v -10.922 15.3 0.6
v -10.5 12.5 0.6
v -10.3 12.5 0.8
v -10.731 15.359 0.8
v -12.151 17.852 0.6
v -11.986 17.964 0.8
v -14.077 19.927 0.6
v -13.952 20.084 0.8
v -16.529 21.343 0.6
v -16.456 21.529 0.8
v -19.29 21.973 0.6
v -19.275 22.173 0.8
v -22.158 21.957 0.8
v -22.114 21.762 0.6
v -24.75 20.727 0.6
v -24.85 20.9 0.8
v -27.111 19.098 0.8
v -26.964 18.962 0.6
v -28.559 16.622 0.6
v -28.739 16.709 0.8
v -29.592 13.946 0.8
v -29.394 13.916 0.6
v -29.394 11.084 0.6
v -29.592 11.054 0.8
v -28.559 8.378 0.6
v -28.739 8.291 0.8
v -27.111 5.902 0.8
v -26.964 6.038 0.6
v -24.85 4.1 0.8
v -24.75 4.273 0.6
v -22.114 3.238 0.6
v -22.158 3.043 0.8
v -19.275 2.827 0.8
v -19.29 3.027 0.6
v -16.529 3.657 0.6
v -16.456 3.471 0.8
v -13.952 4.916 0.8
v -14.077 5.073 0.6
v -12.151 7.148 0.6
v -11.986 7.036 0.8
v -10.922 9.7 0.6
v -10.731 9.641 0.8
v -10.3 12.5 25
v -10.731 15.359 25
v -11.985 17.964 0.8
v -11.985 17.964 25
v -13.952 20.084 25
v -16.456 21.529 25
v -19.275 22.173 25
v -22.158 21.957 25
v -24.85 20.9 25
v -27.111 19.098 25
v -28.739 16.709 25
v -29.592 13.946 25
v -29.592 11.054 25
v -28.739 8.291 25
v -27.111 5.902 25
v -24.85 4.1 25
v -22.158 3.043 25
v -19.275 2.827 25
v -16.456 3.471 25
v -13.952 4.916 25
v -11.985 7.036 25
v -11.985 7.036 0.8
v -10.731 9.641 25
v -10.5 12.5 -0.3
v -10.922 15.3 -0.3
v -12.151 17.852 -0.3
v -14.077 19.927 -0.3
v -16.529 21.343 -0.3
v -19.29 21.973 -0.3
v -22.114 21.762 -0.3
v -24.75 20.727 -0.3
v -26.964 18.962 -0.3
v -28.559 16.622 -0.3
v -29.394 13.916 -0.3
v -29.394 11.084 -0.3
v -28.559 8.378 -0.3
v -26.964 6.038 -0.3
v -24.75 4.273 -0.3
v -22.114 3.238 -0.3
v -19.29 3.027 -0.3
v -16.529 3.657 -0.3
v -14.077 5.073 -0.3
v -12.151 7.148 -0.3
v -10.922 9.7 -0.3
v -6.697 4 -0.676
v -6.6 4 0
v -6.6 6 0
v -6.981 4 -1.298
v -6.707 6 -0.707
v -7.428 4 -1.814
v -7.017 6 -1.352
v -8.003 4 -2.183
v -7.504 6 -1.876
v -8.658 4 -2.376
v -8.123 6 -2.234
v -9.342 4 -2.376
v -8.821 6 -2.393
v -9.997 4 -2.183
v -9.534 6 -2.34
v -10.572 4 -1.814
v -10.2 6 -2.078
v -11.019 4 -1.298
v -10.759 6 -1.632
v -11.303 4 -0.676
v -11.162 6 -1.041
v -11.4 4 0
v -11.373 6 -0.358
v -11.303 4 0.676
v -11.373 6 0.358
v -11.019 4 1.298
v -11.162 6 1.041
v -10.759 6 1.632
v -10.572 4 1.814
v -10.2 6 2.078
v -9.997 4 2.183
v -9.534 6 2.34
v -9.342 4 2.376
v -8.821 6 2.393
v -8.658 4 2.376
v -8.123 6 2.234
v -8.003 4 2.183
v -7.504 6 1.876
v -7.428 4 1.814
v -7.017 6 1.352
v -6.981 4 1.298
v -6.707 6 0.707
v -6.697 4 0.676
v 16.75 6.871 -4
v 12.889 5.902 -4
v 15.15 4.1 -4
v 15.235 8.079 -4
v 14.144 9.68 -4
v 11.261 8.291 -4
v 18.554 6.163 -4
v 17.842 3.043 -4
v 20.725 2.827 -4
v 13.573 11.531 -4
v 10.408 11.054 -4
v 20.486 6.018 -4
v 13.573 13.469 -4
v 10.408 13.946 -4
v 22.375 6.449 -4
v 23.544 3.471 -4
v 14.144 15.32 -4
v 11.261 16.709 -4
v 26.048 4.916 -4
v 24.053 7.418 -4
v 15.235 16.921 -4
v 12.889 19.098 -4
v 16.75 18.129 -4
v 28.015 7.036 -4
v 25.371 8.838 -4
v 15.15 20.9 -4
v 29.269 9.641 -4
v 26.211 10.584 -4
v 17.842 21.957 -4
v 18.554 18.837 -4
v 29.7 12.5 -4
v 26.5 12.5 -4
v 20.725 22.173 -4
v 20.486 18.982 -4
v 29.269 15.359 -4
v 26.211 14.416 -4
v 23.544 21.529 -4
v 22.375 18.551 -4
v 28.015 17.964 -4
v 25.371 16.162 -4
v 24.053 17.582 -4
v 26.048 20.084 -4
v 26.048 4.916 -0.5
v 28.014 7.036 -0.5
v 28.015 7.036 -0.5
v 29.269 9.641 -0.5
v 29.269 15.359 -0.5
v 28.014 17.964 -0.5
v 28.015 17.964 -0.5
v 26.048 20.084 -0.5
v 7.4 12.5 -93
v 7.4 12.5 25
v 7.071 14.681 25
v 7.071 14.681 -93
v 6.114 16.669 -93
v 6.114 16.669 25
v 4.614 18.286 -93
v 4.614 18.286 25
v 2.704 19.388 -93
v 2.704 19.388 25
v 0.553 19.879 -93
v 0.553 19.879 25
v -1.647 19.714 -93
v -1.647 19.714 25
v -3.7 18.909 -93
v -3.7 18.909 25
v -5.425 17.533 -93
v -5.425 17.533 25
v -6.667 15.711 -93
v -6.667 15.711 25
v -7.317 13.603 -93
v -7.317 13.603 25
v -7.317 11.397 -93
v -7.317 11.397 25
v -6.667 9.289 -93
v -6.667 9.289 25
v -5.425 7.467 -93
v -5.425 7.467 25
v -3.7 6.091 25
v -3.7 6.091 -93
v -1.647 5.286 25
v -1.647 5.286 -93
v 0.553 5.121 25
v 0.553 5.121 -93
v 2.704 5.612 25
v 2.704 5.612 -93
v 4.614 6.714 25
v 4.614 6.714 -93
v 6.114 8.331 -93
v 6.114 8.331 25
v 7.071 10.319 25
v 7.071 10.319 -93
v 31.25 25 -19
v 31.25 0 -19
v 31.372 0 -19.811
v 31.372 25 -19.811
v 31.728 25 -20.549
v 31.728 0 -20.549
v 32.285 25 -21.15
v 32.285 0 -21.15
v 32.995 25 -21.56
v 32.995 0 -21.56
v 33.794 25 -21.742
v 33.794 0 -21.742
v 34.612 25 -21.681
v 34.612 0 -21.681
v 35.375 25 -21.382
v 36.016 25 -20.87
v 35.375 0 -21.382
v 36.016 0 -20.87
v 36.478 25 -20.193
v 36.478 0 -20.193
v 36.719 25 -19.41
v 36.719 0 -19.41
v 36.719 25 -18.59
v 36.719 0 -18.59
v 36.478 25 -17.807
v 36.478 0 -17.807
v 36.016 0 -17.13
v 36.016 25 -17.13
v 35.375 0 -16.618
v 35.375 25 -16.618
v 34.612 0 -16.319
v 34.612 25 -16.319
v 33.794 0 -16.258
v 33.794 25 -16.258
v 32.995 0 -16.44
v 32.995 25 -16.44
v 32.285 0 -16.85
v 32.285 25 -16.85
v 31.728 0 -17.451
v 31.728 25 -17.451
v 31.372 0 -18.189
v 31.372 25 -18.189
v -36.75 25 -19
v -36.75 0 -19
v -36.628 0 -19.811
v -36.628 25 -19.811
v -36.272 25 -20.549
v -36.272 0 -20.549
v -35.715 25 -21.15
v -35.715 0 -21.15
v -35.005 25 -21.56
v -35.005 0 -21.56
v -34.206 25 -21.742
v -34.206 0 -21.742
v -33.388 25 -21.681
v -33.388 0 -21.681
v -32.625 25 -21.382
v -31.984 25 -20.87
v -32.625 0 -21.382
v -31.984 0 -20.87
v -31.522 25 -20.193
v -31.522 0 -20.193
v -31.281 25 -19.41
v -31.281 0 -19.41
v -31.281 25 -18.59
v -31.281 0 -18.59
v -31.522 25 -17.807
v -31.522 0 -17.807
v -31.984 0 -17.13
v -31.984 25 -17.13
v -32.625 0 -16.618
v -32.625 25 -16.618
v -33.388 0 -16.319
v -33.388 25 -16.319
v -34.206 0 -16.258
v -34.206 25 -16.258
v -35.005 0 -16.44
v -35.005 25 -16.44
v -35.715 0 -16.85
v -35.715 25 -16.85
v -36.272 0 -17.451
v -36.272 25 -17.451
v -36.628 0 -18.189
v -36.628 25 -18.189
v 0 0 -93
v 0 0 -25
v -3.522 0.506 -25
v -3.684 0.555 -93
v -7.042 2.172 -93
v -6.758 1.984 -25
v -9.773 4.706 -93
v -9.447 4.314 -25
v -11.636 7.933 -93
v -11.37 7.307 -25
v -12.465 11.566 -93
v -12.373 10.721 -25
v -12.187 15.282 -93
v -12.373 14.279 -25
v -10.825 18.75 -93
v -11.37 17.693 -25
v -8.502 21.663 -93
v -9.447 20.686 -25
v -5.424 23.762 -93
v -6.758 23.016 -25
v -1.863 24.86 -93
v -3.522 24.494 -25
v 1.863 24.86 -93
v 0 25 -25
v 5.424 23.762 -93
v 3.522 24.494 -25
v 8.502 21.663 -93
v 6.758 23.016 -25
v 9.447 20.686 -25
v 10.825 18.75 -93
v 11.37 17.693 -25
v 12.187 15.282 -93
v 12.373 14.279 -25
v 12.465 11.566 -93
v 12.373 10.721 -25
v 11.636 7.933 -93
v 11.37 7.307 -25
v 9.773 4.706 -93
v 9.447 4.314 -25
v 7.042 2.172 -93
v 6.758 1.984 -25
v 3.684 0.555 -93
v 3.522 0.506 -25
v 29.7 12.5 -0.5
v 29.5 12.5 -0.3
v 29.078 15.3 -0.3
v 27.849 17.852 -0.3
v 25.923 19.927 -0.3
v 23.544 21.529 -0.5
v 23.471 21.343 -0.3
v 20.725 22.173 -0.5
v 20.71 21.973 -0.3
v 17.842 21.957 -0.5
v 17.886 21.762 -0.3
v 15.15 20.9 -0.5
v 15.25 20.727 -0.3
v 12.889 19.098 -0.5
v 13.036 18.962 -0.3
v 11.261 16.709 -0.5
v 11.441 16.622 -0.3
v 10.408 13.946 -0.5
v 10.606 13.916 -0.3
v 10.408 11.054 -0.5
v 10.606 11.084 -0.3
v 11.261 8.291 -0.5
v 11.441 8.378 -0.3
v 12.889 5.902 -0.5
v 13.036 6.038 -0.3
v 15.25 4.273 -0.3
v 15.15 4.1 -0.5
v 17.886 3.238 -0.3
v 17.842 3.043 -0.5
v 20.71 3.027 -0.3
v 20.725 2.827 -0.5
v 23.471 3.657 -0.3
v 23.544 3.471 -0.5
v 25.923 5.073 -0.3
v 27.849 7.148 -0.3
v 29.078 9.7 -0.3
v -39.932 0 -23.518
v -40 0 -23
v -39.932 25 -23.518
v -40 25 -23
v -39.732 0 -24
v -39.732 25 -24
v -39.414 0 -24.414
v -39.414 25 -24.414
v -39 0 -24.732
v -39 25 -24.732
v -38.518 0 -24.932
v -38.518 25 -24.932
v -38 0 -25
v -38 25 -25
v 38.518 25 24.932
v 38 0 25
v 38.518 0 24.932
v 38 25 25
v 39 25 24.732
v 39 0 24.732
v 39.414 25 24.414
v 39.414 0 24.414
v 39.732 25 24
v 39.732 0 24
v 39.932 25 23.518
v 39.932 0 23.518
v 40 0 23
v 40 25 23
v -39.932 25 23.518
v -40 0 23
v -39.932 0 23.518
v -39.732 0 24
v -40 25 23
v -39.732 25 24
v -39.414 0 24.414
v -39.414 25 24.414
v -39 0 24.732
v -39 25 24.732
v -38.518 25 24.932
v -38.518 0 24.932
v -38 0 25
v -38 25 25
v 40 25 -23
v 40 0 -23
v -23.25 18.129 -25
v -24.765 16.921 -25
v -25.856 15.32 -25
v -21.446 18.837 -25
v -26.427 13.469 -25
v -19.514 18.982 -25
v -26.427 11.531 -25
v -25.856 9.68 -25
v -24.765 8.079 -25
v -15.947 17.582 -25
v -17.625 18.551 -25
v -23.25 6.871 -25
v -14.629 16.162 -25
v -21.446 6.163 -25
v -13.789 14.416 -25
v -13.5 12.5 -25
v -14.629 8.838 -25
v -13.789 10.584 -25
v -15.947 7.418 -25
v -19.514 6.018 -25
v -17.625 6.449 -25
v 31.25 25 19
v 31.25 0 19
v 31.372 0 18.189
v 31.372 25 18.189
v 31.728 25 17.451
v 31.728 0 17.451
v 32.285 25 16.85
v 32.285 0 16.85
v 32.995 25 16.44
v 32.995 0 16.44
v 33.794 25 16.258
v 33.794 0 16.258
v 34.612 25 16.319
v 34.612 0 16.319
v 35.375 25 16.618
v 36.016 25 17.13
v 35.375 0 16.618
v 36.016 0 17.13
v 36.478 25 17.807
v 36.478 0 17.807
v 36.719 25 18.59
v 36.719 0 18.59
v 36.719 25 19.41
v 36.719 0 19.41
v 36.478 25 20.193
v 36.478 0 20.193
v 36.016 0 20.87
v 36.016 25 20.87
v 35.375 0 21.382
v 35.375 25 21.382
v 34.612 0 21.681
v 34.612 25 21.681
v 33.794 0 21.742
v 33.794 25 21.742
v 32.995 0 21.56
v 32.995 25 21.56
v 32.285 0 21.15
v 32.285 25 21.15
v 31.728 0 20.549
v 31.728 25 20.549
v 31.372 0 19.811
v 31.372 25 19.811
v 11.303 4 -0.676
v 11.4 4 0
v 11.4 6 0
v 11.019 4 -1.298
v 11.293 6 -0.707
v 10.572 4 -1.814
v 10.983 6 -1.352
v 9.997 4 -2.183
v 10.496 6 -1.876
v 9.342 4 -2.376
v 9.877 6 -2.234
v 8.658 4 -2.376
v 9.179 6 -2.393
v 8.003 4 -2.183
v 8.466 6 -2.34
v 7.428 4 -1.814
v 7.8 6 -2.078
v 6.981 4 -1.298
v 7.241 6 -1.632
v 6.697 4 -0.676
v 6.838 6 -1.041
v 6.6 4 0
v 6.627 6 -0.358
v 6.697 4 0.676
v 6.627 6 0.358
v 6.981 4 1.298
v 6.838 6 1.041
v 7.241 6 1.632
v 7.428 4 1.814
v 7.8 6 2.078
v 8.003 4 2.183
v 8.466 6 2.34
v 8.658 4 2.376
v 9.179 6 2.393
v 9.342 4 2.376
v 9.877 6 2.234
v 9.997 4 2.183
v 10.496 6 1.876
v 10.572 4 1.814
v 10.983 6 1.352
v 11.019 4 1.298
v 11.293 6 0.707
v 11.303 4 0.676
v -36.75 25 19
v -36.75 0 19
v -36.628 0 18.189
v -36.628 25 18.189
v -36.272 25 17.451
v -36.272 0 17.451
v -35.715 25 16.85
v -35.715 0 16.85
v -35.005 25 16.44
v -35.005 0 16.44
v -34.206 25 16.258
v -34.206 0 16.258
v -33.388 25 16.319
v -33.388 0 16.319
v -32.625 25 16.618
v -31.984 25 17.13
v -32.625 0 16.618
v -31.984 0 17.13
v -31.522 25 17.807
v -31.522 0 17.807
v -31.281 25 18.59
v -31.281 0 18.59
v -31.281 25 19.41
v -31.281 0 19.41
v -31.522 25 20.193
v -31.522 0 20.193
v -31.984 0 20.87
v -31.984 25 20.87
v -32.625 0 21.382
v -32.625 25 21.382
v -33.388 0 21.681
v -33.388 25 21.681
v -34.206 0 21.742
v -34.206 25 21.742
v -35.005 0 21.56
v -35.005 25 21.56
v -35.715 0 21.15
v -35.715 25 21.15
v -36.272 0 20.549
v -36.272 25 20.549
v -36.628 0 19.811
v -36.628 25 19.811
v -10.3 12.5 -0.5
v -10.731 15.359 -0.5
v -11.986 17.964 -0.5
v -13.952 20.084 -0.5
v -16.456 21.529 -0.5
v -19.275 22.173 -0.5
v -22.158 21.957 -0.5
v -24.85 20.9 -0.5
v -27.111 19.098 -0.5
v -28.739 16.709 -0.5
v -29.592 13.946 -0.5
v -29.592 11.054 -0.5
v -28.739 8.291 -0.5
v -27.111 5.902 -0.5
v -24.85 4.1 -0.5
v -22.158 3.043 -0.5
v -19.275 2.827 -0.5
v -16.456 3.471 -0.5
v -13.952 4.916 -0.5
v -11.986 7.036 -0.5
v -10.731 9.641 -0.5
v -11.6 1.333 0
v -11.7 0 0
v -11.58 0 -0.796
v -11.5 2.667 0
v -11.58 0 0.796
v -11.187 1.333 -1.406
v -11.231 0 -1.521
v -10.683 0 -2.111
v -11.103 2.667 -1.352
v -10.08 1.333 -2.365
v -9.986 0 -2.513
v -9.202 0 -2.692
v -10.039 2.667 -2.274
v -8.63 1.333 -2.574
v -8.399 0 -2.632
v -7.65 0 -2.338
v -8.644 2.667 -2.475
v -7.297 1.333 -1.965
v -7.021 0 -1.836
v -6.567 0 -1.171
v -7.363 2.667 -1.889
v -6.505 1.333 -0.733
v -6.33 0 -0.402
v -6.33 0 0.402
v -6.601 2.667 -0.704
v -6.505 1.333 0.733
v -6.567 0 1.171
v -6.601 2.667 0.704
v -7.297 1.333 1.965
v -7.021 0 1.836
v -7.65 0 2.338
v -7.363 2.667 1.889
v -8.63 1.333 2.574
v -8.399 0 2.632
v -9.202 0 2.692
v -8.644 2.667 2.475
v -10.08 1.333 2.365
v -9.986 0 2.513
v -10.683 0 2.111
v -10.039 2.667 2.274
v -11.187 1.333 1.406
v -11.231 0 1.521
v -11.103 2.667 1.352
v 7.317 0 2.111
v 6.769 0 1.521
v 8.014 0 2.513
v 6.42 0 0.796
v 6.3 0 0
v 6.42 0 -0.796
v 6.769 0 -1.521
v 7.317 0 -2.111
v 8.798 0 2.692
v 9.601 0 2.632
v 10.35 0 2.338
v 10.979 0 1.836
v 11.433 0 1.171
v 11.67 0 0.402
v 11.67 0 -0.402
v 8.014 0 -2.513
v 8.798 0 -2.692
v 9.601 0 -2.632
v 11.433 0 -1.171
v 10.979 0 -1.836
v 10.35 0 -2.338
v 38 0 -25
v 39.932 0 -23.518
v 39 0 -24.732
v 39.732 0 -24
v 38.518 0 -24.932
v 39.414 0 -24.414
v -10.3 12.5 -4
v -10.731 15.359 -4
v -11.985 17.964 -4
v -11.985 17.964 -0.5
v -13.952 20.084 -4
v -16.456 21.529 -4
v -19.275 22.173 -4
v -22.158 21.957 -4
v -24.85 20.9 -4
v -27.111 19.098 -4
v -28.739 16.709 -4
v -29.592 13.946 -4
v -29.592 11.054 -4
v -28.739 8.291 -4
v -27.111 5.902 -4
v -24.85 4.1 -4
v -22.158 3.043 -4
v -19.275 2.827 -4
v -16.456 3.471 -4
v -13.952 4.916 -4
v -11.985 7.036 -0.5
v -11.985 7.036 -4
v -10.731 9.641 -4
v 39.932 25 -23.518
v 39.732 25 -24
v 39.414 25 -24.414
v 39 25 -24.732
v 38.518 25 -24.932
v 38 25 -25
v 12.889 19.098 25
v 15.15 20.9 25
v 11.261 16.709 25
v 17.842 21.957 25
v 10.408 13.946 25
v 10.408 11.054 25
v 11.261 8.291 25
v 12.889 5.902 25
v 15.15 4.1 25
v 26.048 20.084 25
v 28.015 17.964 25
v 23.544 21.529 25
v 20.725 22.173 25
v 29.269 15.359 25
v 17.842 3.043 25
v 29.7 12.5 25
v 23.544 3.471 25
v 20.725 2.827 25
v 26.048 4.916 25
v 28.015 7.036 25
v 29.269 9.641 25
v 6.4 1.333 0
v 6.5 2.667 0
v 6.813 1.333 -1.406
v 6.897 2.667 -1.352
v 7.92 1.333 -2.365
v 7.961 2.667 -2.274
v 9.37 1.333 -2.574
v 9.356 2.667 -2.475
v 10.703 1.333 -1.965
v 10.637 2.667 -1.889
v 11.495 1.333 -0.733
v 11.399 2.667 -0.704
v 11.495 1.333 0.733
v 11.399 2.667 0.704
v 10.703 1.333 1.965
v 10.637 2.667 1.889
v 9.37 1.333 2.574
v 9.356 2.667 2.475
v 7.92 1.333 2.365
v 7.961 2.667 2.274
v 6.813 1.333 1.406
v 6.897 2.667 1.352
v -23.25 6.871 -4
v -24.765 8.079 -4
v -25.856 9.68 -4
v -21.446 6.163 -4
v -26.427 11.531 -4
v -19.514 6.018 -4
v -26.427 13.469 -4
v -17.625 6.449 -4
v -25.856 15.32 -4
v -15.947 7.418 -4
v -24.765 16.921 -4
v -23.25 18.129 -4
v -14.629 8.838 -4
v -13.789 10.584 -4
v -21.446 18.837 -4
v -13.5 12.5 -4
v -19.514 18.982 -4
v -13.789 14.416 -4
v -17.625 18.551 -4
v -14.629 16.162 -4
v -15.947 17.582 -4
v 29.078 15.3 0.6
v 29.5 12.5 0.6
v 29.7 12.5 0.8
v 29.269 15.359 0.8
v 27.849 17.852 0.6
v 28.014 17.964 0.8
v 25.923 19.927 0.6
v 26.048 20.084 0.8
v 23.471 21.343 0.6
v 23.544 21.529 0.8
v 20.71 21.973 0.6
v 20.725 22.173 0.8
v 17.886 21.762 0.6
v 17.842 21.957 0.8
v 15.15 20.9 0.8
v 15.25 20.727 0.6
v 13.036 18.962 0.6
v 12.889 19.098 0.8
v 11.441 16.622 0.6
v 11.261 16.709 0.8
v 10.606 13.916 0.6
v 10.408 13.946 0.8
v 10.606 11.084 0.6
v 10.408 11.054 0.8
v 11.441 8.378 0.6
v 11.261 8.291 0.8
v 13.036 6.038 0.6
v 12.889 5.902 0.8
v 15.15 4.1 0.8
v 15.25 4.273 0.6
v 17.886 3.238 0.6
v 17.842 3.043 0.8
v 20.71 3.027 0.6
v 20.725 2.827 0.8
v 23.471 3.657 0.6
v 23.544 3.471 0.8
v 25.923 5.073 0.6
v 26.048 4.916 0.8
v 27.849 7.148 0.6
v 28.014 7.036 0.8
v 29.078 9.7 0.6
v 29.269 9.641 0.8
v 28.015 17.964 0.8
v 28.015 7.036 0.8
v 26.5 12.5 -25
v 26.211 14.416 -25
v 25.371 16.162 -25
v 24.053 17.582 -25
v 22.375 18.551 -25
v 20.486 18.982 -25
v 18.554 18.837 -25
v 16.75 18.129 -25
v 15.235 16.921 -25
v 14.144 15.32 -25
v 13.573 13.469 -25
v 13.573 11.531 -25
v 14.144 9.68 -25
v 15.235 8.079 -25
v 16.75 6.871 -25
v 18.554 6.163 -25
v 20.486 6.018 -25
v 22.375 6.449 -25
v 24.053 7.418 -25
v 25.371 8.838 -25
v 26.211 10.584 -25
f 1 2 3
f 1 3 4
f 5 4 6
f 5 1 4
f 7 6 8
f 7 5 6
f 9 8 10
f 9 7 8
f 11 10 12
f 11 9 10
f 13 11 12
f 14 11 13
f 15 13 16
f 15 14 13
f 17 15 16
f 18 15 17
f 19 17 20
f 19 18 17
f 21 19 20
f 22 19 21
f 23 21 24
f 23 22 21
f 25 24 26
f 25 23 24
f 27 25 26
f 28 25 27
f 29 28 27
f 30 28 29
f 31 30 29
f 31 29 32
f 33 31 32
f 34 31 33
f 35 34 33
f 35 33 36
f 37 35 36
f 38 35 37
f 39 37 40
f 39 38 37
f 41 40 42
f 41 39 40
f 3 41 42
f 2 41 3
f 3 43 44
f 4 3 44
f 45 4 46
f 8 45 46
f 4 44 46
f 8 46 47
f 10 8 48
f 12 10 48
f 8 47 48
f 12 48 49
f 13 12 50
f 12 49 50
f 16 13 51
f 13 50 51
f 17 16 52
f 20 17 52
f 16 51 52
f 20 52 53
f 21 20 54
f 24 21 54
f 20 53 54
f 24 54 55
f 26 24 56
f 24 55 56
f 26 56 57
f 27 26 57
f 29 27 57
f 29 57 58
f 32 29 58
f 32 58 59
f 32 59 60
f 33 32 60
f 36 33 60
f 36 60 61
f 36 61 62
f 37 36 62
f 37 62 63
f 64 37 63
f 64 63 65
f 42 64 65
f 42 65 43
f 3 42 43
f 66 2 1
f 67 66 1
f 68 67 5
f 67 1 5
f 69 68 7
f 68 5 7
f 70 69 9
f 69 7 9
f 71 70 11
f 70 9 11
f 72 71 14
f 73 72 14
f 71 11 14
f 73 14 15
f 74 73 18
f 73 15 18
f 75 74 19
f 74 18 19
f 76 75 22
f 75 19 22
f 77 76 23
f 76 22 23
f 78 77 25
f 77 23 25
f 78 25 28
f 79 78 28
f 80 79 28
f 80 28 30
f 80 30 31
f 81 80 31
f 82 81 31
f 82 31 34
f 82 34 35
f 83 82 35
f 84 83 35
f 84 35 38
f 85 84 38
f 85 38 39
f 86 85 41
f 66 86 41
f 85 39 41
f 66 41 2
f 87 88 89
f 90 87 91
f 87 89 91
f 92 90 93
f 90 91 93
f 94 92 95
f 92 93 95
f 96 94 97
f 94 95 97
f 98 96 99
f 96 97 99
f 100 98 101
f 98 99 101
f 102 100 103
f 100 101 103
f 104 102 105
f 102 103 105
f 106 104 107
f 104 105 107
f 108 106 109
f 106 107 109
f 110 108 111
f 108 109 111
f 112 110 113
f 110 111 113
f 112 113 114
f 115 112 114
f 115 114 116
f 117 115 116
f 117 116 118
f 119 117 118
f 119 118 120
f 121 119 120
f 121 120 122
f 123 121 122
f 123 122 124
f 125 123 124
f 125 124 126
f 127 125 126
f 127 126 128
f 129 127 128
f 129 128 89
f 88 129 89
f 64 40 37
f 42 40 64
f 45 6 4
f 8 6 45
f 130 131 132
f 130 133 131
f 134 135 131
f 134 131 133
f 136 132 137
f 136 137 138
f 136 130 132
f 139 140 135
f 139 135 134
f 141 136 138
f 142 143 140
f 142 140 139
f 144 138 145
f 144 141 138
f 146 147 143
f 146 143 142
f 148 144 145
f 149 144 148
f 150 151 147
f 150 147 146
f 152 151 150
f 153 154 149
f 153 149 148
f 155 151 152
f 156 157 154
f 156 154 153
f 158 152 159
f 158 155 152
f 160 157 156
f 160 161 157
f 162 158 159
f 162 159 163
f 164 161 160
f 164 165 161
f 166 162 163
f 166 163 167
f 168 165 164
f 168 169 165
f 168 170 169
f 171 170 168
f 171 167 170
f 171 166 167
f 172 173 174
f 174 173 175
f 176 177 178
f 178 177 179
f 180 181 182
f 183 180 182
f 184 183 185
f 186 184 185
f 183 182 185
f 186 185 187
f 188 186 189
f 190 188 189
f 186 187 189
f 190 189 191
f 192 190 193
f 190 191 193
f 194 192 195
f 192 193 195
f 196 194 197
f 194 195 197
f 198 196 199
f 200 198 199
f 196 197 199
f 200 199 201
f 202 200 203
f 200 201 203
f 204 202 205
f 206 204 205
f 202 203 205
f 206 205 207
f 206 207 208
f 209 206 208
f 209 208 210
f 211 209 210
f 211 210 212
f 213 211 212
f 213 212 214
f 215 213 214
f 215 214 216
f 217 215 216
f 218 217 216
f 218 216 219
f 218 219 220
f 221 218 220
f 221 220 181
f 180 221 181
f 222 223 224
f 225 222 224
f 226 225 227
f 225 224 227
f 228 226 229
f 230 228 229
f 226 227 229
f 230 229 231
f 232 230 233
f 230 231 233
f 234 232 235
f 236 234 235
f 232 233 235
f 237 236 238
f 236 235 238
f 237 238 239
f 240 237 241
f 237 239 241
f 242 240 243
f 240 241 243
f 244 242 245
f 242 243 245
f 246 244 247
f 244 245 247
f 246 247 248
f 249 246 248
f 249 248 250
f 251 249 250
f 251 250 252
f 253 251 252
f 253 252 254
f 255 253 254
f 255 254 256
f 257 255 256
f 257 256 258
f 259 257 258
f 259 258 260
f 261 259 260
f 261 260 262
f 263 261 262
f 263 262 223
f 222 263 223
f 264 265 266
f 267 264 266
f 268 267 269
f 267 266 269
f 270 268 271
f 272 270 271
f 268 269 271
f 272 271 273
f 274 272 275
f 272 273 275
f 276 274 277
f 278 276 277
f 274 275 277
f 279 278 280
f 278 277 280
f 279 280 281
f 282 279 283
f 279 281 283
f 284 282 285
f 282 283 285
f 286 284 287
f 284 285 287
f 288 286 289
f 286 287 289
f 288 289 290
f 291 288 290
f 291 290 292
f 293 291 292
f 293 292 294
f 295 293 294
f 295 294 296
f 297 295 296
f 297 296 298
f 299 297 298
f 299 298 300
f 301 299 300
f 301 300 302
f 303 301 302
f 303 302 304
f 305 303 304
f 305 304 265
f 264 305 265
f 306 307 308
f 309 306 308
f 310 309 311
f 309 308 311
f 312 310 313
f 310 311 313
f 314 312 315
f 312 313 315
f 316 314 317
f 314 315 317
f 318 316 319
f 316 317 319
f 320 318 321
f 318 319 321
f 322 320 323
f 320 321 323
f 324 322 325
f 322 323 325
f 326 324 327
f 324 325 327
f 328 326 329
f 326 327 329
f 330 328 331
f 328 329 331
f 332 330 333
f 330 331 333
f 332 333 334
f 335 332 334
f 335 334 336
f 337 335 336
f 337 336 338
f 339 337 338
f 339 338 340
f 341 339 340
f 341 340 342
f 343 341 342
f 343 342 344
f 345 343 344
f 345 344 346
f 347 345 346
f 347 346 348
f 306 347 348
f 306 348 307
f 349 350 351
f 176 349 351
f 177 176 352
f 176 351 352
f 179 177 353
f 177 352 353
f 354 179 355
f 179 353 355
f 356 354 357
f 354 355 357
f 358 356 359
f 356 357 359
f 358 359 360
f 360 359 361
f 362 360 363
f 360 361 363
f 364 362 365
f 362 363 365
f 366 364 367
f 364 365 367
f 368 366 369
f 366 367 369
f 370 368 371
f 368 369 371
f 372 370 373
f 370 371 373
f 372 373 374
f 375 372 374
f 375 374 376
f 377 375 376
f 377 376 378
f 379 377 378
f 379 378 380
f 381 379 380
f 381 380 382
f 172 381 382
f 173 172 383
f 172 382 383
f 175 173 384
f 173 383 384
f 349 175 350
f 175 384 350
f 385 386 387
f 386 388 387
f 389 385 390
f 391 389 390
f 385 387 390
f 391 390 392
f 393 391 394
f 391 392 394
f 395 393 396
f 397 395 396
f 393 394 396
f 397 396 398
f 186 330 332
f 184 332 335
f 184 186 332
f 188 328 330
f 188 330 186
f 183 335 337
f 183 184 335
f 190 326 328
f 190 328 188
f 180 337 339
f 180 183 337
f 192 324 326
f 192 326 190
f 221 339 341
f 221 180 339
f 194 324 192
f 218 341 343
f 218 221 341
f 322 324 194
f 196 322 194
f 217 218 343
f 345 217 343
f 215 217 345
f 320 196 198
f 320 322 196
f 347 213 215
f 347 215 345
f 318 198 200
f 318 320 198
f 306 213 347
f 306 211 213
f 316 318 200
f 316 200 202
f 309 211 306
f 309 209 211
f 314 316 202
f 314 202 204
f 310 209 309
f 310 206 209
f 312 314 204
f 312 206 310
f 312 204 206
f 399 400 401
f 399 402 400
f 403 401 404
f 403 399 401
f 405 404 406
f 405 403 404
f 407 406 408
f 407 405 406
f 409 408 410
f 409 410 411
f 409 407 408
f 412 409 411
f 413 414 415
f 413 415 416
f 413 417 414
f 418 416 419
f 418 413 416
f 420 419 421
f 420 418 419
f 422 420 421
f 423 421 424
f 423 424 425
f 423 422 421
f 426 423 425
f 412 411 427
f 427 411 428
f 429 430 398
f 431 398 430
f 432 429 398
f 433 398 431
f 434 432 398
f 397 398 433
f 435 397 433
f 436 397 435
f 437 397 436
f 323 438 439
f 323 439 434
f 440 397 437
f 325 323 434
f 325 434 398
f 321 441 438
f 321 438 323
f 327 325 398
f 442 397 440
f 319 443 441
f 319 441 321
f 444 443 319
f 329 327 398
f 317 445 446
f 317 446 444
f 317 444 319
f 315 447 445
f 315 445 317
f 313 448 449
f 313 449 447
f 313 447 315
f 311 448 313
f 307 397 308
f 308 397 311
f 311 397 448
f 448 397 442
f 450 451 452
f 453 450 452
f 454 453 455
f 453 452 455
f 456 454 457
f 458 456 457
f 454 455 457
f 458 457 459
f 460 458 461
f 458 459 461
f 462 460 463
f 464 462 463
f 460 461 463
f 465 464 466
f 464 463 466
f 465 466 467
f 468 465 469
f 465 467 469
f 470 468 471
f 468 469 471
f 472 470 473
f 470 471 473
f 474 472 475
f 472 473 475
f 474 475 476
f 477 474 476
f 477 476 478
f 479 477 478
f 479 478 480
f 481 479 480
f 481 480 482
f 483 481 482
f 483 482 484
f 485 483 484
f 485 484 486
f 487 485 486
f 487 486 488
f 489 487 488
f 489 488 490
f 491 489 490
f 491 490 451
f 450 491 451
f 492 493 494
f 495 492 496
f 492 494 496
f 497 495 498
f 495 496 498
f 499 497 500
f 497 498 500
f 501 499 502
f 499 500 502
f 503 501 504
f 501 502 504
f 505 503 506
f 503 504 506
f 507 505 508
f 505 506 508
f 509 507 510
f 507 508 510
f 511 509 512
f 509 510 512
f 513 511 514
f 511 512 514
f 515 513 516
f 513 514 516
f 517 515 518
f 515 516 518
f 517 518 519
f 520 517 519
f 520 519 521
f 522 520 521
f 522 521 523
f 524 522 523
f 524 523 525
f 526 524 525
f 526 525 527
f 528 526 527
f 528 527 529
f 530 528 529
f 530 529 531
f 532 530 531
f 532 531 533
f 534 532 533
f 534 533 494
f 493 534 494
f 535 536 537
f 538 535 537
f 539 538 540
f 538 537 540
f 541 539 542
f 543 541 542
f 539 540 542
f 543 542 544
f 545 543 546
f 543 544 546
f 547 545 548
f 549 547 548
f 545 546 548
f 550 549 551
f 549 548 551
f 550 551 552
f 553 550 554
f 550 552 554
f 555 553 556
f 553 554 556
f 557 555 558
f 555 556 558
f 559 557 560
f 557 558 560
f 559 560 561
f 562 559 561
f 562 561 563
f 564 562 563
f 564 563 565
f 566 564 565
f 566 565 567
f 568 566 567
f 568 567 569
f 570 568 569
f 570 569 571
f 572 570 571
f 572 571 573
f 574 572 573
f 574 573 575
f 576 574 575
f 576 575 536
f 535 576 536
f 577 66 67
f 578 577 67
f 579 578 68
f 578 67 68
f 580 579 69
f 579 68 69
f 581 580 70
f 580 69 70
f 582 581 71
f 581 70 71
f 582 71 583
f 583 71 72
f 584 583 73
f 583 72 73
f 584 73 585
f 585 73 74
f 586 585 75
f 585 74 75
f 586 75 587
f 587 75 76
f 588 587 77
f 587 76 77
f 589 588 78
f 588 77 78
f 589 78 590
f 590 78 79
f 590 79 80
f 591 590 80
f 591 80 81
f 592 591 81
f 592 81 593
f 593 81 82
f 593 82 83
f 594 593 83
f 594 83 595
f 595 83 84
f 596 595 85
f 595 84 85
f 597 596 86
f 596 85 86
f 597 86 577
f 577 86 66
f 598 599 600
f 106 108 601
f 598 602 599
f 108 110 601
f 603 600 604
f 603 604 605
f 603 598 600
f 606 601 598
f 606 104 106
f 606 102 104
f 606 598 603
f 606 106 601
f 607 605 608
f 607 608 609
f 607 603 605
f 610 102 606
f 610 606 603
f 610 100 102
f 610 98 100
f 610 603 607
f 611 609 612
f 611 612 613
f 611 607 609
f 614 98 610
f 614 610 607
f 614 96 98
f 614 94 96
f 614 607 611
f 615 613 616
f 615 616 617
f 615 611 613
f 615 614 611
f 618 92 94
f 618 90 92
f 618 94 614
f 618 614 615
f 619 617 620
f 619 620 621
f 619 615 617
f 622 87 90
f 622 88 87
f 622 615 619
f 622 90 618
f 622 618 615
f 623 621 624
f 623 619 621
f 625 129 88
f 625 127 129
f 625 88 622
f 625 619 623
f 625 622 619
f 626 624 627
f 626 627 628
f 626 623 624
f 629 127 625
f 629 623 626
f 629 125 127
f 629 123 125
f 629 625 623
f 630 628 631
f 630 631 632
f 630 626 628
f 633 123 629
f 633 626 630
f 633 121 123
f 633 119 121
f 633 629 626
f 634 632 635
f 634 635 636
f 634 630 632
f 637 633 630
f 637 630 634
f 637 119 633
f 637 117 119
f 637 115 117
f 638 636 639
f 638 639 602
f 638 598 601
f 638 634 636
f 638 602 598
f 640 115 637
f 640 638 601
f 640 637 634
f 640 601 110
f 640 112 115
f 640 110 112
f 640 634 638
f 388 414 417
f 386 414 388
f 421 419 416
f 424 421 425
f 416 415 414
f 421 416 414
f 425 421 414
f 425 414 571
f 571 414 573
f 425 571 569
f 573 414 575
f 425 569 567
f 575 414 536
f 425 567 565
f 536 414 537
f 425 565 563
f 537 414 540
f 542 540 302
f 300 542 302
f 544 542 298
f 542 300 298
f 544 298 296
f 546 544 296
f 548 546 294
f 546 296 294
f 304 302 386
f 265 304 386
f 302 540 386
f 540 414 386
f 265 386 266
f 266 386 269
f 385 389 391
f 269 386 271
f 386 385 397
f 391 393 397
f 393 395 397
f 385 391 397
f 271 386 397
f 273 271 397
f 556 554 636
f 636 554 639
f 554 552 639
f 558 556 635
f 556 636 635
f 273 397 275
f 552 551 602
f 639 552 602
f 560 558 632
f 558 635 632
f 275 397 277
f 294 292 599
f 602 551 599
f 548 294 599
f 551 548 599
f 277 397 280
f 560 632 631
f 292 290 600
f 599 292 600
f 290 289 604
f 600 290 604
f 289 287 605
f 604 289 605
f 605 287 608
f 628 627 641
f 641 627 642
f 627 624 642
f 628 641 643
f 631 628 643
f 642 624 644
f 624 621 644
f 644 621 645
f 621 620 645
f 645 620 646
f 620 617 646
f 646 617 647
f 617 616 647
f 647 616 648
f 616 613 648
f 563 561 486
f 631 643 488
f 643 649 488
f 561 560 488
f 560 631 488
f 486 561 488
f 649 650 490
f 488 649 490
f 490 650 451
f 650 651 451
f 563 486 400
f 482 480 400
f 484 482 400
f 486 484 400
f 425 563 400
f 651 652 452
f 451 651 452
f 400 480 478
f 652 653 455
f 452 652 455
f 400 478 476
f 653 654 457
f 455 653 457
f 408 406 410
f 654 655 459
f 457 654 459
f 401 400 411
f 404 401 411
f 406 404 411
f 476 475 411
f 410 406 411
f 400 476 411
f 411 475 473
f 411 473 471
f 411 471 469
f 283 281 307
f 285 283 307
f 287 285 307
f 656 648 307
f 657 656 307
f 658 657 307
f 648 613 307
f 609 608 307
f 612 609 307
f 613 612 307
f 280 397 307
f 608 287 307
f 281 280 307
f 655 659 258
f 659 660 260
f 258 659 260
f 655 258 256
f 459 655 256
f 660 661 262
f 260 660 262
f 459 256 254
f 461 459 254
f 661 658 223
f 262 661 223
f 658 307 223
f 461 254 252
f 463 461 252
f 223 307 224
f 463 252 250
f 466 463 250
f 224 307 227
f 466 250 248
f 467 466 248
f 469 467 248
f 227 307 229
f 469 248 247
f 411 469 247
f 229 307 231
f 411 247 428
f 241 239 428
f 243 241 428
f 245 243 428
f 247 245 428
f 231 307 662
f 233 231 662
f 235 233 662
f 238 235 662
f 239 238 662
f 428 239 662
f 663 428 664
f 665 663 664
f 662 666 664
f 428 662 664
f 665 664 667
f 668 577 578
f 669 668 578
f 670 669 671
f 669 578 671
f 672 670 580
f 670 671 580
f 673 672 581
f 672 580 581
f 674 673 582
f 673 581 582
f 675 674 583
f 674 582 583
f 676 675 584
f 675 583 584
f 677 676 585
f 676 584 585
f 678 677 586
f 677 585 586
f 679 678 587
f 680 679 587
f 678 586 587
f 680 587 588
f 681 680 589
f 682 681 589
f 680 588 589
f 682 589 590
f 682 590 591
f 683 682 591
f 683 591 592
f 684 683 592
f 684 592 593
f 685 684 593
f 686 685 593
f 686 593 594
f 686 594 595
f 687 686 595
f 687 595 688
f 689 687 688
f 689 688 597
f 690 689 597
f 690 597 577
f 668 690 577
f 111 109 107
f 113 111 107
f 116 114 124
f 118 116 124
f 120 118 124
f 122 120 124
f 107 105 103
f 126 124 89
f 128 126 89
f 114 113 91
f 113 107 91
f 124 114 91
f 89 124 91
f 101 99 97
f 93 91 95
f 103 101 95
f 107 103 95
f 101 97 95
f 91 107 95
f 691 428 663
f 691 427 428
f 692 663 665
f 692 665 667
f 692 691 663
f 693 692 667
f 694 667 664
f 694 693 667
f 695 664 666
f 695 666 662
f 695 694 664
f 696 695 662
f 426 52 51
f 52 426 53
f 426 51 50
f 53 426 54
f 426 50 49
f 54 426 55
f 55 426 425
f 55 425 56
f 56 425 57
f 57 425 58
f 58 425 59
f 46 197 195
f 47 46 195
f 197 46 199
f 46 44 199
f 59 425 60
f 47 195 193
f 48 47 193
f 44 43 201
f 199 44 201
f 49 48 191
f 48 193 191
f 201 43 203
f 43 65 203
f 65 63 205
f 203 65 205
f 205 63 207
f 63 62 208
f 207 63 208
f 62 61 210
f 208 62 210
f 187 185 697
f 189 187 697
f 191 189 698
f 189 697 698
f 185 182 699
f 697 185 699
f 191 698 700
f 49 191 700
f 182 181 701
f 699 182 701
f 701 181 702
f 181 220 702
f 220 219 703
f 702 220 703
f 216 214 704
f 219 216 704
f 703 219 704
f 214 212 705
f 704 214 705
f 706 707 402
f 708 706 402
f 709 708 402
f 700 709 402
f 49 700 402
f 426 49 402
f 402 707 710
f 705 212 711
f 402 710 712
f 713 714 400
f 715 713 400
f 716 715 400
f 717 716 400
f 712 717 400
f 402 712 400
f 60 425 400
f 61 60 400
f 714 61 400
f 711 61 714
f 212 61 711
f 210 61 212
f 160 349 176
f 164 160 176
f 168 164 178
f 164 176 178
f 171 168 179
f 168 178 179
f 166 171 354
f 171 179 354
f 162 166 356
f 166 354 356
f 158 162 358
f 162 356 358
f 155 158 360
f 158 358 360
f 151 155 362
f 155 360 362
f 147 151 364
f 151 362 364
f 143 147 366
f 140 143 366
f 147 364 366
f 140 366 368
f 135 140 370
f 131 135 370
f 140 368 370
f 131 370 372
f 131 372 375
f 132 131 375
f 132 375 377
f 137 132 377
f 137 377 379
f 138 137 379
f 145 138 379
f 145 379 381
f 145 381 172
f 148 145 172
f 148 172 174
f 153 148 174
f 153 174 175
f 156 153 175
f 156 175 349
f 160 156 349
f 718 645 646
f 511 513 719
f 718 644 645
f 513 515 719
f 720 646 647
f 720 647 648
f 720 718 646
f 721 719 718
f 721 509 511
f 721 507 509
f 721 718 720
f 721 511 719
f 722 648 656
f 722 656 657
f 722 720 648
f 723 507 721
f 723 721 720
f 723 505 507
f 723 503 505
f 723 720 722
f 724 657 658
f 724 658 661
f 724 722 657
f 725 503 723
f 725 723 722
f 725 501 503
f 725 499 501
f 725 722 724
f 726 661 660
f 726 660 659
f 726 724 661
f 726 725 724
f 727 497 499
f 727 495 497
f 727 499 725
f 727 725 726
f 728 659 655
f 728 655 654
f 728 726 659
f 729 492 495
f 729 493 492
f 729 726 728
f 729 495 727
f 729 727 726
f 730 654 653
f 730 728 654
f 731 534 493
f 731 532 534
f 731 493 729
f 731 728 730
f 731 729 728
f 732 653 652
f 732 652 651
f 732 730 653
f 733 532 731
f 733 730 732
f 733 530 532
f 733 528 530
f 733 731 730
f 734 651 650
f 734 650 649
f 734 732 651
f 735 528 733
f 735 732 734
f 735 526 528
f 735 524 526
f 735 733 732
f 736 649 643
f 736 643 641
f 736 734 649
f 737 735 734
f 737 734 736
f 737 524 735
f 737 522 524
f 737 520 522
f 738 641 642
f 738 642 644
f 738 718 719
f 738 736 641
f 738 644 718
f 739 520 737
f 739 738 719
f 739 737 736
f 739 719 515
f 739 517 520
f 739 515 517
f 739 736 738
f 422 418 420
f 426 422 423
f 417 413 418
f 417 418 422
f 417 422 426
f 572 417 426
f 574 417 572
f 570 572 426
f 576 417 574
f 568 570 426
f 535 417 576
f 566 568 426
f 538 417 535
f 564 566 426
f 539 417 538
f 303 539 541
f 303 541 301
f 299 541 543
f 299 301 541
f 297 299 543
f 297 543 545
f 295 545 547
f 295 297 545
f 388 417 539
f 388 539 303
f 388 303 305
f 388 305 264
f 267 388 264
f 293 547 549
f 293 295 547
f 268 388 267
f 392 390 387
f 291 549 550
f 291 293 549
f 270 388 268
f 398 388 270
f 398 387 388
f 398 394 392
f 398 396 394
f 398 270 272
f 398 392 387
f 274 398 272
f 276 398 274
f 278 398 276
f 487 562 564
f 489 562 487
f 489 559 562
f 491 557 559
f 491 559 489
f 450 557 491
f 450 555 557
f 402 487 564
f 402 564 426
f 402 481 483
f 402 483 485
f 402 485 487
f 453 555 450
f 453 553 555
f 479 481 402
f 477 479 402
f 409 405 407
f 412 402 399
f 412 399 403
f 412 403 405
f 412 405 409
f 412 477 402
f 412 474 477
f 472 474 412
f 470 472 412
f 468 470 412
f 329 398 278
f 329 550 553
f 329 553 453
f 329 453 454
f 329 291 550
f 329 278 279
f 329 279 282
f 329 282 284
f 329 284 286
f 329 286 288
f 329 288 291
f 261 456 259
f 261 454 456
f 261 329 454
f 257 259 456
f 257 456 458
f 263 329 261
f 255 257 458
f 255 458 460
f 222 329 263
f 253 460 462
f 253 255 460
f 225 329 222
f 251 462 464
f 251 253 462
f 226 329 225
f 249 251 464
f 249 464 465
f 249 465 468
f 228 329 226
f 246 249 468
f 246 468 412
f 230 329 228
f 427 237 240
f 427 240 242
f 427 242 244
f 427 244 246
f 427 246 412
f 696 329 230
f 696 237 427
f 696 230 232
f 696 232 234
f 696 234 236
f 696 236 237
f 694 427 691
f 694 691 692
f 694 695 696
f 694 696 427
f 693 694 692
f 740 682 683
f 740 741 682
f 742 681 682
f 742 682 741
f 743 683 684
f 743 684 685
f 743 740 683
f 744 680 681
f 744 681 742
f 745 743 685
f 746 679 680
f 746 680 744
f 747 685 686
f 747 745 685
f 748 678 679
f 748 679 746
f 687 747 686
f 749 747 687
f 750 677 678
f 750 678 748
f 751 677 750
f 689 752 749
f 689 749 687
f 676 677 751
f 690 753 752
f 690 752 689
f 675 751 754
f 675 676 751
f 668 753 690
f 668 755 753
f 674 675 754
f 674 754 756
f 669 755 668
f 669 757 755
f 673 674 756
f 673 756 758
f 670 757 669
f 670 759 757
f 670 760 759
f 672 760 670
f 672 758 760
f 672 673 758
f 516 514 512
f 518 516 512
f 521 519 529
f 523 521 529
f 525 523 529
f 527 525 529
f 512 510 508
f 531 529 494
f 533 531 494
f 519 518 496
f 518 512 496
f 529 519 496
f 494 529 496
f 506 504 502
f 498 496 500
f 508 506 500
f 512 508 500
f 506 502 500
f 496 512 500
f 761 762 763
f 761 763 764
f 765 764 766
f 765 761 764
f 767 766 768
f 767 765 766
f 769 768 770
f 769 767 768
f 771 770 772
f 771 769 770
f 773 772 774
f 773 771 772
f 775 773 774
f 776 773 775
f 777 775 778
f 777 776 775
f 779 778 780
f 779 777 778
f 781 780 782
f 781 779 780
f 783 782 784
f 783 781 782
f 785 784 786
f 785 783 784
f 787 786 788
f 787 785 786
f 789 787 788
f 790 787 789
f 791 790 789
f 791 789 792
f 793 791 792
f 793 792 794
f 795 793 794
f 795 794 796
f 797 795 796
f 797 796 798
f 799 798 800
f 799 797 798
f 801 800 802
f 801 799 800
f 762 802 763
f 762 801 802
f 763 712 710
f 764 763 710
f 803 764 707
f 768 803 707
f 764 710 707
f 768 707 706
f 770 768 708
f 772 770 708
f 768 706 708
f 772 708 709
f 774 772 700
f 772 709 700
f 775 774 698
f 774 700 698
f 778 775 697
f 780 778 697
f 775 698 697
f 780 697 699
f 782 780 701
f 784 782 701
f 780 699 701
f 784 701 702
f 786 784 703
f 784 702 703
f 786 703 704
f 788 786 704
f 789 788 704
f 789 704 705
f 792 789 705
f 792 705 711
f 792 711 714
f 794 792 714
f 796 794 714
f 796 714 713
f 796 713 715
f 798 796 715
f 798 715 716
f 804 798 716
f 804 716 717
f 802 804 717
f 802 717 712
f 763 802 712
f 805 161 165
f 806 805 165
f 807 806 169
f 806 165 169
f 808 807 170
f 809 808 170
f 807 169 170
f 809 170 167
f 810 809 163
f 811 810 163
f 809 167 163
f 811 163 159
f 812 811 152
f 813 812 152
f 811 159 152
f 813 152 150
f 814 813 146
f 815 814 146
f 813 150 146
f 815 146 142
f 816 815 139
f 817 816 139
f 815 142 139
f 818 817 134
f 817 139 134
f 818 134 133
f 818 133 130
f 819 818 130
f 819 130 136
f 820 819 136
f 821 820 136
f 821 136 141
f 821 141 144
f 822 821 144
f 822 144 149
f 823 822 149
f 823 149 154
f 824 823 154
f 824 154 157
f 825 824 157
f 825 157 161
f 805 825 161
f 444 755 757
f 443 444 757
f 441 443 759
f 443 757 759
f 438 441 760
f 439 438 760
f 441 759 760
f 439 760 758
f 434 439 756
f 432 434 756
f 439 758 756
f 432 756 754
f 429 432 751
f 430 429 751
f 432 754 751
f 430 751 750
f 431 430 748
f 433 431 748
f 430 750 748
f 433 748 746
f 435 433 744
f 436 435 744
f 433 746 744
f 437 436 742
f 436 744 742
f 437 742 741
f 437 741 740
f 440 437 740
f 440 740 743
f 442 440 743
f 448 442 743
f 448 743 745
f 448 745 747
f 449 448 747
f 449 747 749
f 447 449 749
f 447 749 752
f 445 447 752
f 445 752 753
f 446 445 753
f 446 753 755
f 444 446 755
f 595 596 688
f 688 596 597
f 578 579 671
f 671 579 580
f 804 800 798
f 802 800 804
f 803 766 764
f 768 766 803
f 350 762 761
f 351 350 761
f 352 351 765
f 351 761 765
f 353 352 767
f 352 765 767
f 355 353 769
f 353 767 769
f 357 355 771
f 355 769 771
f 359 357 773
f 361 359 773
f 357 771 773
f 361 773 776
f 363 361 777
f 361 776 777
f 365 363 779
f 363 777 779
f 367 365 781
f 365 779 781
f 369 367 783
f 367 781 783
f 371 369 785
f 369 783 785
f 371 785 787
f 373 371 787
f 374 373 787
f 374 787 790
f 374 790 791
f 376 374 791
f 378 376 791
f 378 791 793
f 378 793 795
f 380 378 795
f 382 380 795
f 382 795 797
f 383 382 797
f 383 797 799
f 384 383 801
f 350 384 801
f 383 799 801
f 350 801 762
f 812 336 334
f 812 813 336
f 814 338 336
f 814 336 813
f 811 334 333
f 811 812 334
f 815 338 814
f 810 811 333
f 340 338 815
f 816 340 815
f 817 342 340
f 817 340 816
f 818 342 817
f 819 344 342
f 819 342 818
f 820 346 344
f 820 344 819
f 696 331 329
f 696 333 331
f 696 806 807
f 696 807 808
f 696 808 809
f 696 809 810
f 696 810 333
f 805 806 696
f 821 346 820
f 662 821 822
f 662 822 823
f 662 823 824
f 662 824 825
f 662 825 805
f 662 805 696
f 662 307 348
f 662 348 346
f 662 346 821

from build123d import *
from OCP.BRepFilletAPI import BRepFilletAPI_MakeChamfer

# Parameters (mm, degrees)
SKETCH1_W            = 80
SKETCH1_H            = 50
BOSS_EXTRUDE1_DEPTH  = 25
M5_CLEARANCE_HOLE1_D = 5.5
SKETCH5_R            = 12.5
SKETCH5_R_2          = 6.985
BOSS_EXTRUDE2_DEPTH  = 68
SKETCH4_R            = 9.7
CUT_EXTRUDE2_DEPTH   = 29
SKETCH4_4_R          = 7.4
CUT_EXTRUDE3_DEPTH   = 128.078715763
SKETCH6_R            = 6.5
CUT_EXTRUDE4_DEPTH   = 101.727354775
BOSS_EXTRUDE3_START  = 1.3
SKETCH7_R            = 9.7
SKETCH7_R_2          = 9.5
BOSS_EXTRUDE3_DEPTH  = 1.3
CHAMFER2_SIZE        = 0.2
HOLE2_D              = 4.8
HOLE2_DEPTH          = 6
HOLE2_CBORE_D        = 5.4
HOLE2_CBORE_DEPTH    = 4
CHAMFER3_SIZE        = 4
CHAMFER3_SIZE_2      = 0.3
FILLET1_R            = 2


with BuildPart() as part:
    # Sketch1 → Boss-Extrude1 (new body)
    with BuildSketch(Plane(origin=(0, 0, 0), x_dir=(1, 0, 0), z_dir=(0, 1, 0))):
        Rectangle(SKETCH1_W, SKETCH1_H)
    extrude(amount=BOSS_EXTRUDE1_DEPTH)

    # M5 Clearance Hole1 (through all)
    with Locations(Plane(origin=(0, 25, 0), x_dir=(1, 0, 0), z_dir=(0, 1, 0))):
        with Locations((-34, 19), (34, 19), (34, -19), (-34, -19)):
            Hole(M5_CLEARANCE_HOLE1_D / 2)

    # Sketch5 → Boss-Extrude2 (add)
    with BuildSketch(Plane(origin=(0, 0, -25), x_dir=(-1, 0, 0), z_dir=(0, 0, -1))):
        with Locations(Location((0, 12.5, 0), (0, 0, 270))):
            Circle(SKETCH5_R)
        with Locations((0, 12.5)):
            Circle(SKETCH5_R_2, mode=Mode.SUBTRACT)
    extrude(amount=BOSS_EXTRUDE2_DEPTH)

    # Sketch4 → Cut-Extrude2 (cut)
    with BuildSketch(Plane.XY.offset(25)):
        with Locations((-20, 12.5)):
            Circle(SKETCH4_R)
        with Locations((20, 12.5)):
            Circle(SKETCH4_R)
    extrude(amount=-CUT_EXTRUDE2_DEPTH, mode=Mode.SUBTRACT)

    # Sketch4<4> → Cut-Extrude3 (cut, through all)
    with BuildSketch(Plane.XY.offset(25)):
        with Locations((0, 12.5)):
            Circle(SKETCH4_4_R)
    extrude(amount=-CUT_EXTRUDE3_DEPTH, mode=Mode.SUBTRACT)

    # Sketch6 → Cut-Extrude4 (cut, through all)
    with BuildSketch(Plane.XY.offset(-4)):
        with Locations((-20, 12.5)):
            Circle(SKETCH6_R)
        with Locations((20, 12.5)):
            Circle(SKETCH6_R)
    extrude(amount=-CUT_EXTRUDE4_DEPTH, mode=Mode.SUBTRACT)

    # Sketch7 → Boss-Extrude3 (add)
    # profile 1 of 2: a face of its own
    with BuildSketch(Plane.XY.offset(-0.5).offset(BOSS_EXTRUDE3_START)):
        with Locations((-20, 12.5)):
            Circle(SKETCH7_R)
        with Locations((-20, 12.5)):
            Circle(SKETCH7_R_2, mode=Mode.SUBTRACT)
    # profile 2 of 2: a face of its own
    with BuildSketch(Plane.XY.offset(-0.5).offset(BOSS_EXTRUDE3_START)):
        with Locations((20, 12.5)):
            Circle(SKETCH7_R)
        with Locations((20, 12.5)):
            Circle(SKETCH7_R_2, mode=Mode.SUBTRACT)
    extrude(amount=-BOSS_EXTRUDE3_DEPTH)

    # Chamfer2
    chamfer2_edges = [part.edges().sort_by_distance(p)[0] for p in [
        (-29.5, 12.5, -0.5),
        (-29.5, 12.5, 0.8),
        (10.5, 12.5, -0.5),
        (10.5, 12.5, 0.8),
    ]]
    chamfer(chamfer2_edges, length=CHAMFER2_SIZE - 0.0001)  # a hair under: the kernel refuses the full size

    # Hole2
    with Locations(Plane(origin=(0, 0, 0), x_dir=(-1, 0, 0), z_dir=(0, -1, 0))):
        with Locations((-9, 0), (9, 0)):
            CounterBoreHole(HOLE2_D / 2, HOLE2_CBORE_D / 2, HOLE2_CBORE_DEPTH, depth=HOLE2_DEPTH)

    # Chamfer3
    chamfer3_edges_1 = [part.edges().sort_by_distance(p)[0] for p in [
        (-6.3, 4, 0),
    ]]
    chamfer3_side_1 = [part.faces().sort_by_distance(p)[0] for p in [
        (-6.3, 3.994, 0),
    ]]
    chamfer3_edges_2 = [part.edges().sort_by_distance(p)[0] for p in [
        (11.7, 4, 0),
    ]]
    chamfer3_side_2 = [part.faces().sort_by_distance(p)[0] for p in [
        (11.7, 3.994, 0),
    ]]
    chamfer3 = BRepFilletAPI_MakeChamfer(part.part.solid().wrapped)
    for e in chamfer3_edges_1:
        chamfer3.Add(CHAMFER3_SIZE - 0.0001, CHAMFER3_SIZE_2 - 0.0001, e.wrapped, chamfer3_side_1[0].wrapped)
    for e in chamfer3_edges_2:
        chamfer3.Add(CHAMFER3_SIZE - 0.0001, CHAMFER3_SIZE_2 - 0.0001, e.wrapped, chamfer3_side_2[0].wrapped)
    add(Compound.cast(chamfer3.Shape()), mode=Mode.REPLACE)  # a hair under: the kernel refuses the full size

    # Fillet1
    fillet1_edges = [part.edges().sort_by_distance(p)[0] for p in [
        (40, 12.5, 25),
        (-40, 12.5, 25),
        (-40, 12.5, -25),
        (40, 12.5, -25),
    ]]
    fillet(fillet1_edges, radius=FILLET1_R)


solid = part.part
